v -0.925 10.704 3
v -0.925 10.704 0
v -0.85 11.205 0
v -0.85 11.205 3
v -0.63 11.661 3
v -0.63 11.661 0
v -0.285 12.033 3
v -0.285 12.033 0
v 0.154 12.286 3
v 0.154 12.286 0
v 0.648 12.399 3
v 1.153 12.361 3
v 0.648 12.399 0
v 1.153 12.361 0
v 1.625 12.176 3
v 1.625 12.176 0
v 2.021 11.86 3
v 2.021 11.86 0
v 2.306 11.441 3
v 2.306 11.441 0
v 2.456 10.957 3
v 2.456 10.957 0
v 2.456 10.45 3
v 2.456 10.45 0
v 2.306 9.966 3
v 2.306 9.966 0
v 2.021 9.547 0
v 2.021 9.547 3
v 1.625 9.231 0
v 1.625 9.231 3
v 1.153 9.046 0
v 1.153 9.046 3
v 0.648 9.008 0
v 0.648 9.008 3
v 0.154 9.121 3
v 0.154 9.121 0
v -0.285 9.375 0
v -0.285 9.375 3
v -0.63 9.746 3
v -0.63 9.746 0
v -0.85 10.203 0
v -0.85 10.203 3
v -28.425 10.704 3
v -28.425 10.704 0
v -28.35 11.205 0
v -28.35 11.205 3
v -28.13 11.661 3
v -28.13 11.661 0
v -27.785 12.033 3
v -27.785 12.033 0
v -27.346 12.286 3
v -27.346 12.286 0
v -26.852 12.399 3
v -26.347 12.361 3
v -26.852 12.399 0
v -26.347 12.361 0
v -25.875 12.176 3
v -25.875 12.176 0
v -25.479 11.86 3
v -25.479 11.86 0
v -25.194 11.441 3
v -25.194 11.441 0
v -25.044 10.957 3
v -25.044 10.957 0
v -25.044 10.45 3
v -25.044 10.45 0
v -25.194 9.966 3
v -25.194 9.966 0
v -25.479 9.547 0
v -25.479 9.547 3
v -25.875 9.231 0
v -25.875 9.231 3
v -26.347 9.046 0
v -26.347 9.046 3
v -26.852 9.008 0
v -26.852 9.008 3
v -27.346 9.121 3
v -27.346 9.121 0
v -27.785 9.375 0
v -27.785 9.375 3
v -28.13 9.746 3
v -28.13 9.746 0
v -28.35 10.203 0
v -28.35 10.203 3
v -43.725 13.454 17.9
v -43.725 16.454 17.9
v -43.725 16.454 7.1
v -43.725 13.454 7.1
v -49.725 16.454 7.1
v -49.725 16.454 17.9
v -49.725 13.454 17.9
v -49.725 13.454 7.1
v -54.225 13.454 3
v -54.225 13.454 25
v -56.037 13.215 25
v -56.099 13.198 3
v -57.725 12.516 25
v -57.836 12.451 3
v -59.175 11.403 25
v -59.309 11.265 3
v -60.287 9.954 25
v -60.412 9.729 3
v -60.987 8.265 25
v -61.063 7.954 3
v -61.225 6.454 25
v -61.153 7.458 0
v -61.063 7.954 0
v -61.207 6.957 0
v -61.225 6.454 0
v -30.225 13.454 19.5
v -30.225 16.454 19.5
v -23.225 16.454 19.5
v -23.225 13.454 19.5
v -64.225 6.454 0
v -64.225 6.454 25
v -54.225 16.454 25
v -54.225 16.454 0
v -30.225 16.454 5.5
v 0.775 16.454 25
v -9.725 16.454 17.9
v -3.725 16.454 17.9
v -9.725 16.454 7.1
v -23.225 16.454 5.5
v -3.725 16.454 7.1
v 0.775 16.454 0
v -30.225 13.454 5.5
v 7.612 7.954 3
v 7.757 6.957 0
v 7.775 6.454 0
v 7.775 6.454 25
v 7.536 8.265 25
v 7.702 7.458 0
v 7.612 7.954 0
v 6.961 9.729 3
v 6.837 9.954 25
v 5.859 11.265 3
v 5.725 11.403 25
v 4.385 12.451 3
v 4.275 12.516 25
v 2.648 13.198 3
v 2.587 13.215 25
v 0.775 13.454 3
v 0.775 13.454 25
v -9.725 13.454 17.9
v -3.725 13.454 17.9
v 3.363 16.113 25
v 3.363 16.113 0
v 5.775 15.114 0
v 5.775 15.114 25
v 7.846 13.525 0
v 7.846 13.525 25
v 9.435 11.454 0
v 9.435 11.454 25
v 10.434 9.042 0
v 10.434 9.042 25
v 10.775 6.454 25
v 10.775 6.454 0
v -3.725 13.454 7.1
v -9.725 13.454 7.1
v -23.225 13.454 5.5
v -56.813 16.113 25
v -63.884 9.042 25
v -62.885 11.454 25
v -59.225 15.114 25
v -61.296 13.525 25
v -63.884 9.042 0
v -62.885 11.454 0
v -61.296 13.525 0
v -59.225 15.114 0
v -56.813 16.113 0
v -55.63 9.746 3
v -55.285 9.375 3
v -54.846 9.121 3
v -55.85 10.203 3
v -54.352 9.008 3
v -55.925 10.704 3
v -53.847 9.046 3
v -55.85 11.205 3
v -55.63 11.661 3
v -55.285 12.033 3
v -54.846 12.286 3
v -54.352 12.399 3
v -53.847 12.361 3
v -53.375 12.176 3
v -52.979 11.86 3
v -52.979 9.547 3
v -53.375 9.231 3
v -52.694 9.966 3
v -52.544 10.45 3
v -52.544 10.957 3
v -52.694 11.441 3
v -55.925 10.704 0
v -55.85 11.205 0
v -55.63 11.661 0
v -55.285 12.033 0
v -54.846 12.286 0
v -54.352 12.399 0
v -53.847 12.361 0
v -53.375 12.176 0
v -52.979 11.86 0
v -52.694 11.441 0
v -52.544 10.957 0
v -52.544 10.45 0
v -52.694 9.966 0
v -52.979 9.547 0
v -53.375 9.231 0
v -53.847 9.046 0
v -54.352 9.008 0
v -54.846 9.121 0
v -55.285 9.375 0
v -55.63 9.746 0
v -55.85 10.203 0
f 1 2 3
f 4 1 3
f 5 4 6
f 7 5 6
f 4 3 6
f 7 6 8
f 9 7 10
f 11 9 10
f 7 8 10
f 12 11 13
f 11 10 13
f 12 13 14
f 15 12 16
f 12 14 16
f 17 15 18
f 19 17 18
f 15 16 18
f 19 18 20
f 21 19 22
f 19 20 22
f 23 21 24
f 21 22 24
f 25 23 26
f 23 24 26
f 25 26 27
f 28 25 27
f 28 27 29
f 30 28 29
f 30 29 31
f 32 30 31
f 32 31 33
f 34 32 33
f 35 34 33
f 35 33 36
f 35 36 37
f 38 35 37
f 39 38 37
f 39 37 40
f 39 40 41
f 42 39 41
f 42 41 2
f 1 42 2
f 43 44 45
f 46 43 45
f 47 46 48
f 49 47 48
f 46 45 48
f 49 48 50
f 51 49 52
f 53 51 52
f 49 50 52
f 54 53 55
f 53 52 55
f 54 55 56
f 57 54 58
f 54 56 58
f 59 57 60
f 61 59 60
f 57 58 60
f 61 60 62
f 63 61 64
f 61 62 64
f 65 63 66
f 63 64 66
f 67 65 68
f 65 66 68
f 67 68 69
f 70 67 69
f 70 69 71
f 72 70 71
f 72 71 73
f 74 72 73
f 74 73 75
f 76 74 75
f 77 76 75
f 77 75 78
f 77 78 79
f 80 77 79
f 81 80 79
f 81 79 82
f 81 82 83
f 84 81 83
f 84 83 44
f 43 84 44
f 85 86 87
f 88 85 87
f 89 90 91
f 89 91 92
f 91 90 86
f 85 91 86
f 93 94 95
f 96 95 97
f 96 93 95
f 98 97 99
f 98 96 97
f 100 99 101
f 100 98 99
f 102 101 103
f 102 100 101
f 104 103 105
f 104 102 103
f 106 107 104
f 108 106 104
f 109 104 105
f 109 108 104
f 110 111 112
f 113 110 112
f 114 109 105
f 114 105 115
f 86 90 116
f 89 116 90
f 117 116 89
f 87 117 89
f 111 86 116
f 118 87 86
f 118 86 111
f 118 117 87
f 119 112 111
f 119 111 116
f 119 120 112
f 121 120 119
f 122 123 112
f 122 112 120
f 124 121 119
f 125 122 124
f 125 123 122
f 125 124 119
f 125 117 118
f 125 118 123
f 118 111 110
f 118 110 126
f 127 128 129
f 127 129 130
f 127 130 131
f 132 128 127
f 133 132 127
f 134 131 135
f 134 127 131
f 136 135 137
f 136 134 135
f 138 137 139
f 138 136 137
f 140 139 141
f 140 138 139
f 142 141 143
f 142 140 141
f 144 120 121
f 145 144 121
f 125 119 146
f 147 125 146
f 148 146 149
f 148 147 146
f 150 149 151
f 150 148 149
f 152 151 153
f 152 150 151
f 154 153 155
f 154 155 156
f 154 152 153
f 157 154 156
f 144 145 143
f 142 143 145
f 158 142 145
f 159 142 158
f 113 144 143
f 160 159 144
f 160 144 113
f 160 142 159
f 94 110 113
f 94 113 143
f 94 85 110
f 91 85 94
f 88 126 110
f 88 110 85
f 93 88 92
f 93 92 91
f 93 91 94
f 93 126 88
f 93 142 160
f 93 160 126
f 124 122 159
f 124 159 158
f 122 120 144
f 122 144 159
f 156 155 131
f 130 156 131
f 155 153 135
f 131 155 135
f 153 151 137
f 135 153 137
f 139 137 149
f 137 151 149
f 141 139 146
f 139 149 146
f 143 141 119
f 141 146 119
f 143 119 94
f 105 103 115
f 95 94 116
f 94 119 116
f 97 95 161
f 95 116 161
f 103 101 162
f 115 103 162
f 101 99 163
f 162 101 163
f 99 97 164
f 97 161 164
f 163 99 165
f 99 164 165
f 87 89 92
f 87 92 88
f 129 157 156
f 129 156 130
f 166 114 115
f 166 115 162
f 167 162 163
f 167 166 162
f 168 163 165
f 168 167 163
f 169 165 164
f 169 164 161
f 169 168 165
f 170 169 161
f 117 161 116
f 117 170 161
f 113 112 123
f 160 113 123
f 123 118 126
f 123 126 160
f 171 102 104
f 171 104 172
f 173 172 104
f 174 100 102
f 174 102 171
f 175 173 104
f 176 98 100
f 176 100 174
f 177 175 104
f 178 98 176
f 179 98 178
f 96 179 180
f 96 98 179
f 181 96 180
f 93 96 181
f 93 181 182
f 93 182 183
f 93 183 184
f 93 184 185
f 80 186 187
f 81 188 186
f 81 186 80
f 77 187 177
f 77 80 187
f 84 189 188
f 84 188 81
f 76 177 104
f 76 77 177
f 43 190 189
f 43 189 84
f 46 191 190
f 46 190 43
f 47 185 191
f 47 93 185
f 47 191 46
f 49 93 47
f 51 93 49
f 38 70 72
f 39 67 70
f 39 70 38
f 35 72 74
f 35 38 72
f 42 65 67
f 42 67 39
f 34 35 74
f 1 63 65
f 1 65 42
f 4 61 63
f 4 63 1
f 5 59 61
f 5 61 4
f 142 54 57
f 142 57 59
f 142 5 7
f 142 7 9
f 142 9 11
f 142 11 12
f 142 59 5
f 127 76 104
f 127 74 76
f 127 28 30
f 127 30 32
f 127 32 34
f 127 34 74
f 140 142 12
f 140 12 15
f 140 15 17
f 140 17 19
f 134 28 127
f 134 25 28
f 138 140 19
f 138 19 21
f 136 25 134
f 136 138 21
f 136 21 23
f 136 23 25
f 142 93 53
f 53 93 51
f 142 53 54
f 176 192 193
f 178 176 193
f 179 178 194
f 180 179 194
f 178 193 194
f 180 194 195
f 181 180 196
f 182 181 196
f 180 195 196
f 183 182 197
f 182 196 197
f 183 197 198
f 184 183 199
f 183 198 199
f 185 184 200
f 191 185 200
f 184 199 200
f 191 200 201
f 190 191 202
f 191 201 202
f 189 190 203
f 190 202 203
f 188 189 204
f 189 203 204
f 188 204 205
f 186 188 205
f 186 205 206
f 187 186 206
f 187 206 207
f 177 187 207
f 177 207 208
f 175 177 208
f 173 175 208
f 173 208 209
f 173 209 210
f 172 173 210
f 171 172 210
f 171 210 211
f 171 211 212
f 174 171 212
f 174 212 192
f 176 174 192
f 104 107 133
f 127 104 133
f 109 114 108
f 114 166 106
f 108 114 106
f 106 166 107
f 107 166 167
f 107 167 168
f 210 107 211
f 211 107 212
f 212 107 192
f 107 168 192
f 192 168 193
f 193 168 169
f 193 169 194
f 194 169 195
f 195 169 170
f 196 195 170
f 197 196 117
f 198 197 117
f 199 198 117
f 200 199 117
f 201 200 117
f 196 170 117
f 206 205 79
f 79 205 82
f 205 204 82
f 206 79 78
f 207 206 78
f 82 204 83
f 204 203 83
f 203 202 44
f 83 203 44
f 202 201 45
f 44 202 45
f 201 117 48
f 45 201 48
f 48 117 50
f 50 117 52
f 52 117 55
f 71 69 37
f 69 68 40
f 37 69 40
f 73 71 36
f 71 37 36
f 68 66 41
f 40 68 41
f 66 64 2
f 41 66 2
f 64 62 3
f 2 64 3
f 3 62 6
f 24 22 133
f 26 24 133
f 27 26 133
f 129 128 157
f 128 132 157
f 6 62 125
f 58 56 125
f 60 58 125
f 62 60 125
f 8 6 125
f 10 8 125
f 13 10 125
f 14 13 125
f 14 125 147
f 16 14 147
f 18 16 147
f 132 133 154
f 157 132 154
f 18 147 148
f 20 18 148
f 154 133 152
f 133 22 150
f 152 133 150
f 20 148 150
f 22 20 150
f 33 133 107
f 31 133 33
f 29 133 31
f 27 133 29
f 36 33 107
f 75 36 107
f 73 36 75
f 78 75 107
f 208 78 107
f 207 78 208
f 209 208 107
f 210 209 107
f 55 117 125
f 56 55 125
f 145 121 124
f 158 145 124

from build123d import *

# Parameters (mm, degrees)
BOSS_EXTRU_1_DEPTH      = 25
BOSS_EXTRU_2_DEPTH      = 3
ESQUISSE5_W             = 6
ESQUISSE5_H             = 10.8
ESQUISSE5_W_2           = 7
ESQUISSE5_H_2           = 14
ENL_V_MAT_EXTRU_1_DEPTH = 13
ESQUISSE6_R             = 1.7
ENL_V_MAT_EXTRU_2_DEPTH = 13


with BuildPart() as part:
    # Esquisse1 → Boss.-Extru.1 (new body)
    with BuildSketch(Plane.XY):
        with BuildLine():
            Line((-54.225217391, 16.453664596), (0.774782609, 16.453664596))
            ThreePointArc((0.774782609, 16.453664596), (7.845850421, 13.524732408), (10.774782609, 6.453664596))
            Line((10.774782609, 6.453664596), (7.774782609, 6.453664596))
            ThreePointArc((7.774782609, 6.453664596), (5.724530077, 11.403412065), (0.774782609, 13.453664596))
            Line((0.774782609, 13.453664596), (-54.225217391, 13.453664596))
            ThreePointArc((-54.225217391, 13.453664596), (-59.17496486, 11.403412065), (-61.225217391, 6.453664596))
            Line((-61.225217391, 6.453664596), (-64.225217391, 6.453664596))
            ThreePointArc((-64.225217391, 6.453664596), (-61.296285203, 13.524732408), (-54.225217391, 16.453664596))
        make_face()
    extrude(amount=BOSS_EXTRU_1_DEPTH)

    # Esquisse3 → Boss.-Extru.2 (add)
    with BuildSketch(Plane.XY):
        with BuildLine():
            Line((-61.062614557, 7.953664596), (7.612179774, 7.953664596))
            ThreePointArc((7.612179774, 7.953664596), (5.162264802, 11.908020654), (0.774782609, 13.453664596))
            Line((0.774782609, 13.453664596), (-54.225217391, 13.453664596))
            ThreePointArc((-54.225217391, 13.453664596), (-58.612699585, 11.908020654), (-61.062614557, 7.953664596))
        make_face()
    extrude(amount=BOSS_EXTRU_2_DEPTH)

    # Esquisse5 → Enlèv. mat.-Extru.1 (cut)
    with BuildSketch(Plane(origin=(0, 16.453664596, 0), x_dir=(1, 0, 0), z_dir=(0, 1, 0))):
        with Locations((-46.725217391, -12.5)):
            Rectangle(ESQUISSE5_W, ESQUISSE5_H)
        with Locations((-6.725217391, -12.5)):
            Rectangle(ESQUISSE5_W, ESQUISSE5_H)
        with Locations((-26.725217391, -12.5)):
            Rectangle(ESQUISSE5_W_2, ESQUISSE5_H_2)
    extrude(amount=-ENL_V_MAT_EXTRU_1_DEPTH, mode=Mode.SUBTRACT)

    # Esquisse6 → Enlèv. mat.-Extru.2 (cut)
    with BuildSketch(Plane(origin=(0, 0, 0), x_dir=(-1, 0, 0), z_dir=(0, 0, -1))):
        with Locations((-0.774782609, 10.703664596)):
            Circle(ESQUISSE6_R)
        with Locations((26.725217391, 10.703664596)):
            Circle(ESQUISSE6_R)
        with Locations((54.225217391, 10.703664596)):
            Circle(ESQUISSE6_R)
    extrude(amount=-ENL_V_MAT_EXTRU_2_DEPTH, mode=Mode.SUBTRACT)


solid = part.part
